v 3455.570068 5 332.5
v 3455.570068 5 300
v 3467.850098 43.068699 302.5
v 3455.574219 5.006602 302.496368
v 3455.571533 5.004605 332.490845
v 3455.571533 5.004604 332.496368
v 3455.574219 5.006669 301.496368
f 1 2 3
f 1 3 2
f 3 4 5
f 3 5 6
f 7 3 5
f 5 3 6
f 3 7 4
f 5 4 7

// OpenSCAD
translate(v = [0.0000000000, 0.0000000000, 0.0000000000]) {
	rotate(a = 0.0000000000, v = [0.0000000000, 0.0000000000, 0.0000000000]) {
		color( "Red", a=0.5 ) 
		polyhedron(
		points=[
		[3467.85, 43.0687, 302.5],
		[3455.57, 5.0, 332.5],
		[3455.57, 5.0, 302.5],
		[3455.57, 5.0, 300.0]],
		faces=[[0,1,2],[0,3,1],[0,2,3],[1,3,2]]);
		// import_stl(filename = "STL\\BOOM_EX_375.stl");
	}
}

translate(v = [12315.4098840541, -4259.9804627676, 903.0008418652]) {
	rotate(a = 179.9942740938, v = [-0.8894325067, 0.4570665301, -0.0000243586]) {
		color( "Blue", a=0.5 ) 
		polyhedron(
		points=[
		[-8649.51, 4688.51, 600.0],
		[-8625.71, 4720.65, 570.0],
		[-8625.71, 4720.65, 600.0],
		[-8625.71, 4720.65, 601.0]],
		faces=[[0,1,2],[0,3,1],[0,2,3],[1,3,2]]);
		// import_stl(filename = "STL\\BOOM.stl");
	}
}
